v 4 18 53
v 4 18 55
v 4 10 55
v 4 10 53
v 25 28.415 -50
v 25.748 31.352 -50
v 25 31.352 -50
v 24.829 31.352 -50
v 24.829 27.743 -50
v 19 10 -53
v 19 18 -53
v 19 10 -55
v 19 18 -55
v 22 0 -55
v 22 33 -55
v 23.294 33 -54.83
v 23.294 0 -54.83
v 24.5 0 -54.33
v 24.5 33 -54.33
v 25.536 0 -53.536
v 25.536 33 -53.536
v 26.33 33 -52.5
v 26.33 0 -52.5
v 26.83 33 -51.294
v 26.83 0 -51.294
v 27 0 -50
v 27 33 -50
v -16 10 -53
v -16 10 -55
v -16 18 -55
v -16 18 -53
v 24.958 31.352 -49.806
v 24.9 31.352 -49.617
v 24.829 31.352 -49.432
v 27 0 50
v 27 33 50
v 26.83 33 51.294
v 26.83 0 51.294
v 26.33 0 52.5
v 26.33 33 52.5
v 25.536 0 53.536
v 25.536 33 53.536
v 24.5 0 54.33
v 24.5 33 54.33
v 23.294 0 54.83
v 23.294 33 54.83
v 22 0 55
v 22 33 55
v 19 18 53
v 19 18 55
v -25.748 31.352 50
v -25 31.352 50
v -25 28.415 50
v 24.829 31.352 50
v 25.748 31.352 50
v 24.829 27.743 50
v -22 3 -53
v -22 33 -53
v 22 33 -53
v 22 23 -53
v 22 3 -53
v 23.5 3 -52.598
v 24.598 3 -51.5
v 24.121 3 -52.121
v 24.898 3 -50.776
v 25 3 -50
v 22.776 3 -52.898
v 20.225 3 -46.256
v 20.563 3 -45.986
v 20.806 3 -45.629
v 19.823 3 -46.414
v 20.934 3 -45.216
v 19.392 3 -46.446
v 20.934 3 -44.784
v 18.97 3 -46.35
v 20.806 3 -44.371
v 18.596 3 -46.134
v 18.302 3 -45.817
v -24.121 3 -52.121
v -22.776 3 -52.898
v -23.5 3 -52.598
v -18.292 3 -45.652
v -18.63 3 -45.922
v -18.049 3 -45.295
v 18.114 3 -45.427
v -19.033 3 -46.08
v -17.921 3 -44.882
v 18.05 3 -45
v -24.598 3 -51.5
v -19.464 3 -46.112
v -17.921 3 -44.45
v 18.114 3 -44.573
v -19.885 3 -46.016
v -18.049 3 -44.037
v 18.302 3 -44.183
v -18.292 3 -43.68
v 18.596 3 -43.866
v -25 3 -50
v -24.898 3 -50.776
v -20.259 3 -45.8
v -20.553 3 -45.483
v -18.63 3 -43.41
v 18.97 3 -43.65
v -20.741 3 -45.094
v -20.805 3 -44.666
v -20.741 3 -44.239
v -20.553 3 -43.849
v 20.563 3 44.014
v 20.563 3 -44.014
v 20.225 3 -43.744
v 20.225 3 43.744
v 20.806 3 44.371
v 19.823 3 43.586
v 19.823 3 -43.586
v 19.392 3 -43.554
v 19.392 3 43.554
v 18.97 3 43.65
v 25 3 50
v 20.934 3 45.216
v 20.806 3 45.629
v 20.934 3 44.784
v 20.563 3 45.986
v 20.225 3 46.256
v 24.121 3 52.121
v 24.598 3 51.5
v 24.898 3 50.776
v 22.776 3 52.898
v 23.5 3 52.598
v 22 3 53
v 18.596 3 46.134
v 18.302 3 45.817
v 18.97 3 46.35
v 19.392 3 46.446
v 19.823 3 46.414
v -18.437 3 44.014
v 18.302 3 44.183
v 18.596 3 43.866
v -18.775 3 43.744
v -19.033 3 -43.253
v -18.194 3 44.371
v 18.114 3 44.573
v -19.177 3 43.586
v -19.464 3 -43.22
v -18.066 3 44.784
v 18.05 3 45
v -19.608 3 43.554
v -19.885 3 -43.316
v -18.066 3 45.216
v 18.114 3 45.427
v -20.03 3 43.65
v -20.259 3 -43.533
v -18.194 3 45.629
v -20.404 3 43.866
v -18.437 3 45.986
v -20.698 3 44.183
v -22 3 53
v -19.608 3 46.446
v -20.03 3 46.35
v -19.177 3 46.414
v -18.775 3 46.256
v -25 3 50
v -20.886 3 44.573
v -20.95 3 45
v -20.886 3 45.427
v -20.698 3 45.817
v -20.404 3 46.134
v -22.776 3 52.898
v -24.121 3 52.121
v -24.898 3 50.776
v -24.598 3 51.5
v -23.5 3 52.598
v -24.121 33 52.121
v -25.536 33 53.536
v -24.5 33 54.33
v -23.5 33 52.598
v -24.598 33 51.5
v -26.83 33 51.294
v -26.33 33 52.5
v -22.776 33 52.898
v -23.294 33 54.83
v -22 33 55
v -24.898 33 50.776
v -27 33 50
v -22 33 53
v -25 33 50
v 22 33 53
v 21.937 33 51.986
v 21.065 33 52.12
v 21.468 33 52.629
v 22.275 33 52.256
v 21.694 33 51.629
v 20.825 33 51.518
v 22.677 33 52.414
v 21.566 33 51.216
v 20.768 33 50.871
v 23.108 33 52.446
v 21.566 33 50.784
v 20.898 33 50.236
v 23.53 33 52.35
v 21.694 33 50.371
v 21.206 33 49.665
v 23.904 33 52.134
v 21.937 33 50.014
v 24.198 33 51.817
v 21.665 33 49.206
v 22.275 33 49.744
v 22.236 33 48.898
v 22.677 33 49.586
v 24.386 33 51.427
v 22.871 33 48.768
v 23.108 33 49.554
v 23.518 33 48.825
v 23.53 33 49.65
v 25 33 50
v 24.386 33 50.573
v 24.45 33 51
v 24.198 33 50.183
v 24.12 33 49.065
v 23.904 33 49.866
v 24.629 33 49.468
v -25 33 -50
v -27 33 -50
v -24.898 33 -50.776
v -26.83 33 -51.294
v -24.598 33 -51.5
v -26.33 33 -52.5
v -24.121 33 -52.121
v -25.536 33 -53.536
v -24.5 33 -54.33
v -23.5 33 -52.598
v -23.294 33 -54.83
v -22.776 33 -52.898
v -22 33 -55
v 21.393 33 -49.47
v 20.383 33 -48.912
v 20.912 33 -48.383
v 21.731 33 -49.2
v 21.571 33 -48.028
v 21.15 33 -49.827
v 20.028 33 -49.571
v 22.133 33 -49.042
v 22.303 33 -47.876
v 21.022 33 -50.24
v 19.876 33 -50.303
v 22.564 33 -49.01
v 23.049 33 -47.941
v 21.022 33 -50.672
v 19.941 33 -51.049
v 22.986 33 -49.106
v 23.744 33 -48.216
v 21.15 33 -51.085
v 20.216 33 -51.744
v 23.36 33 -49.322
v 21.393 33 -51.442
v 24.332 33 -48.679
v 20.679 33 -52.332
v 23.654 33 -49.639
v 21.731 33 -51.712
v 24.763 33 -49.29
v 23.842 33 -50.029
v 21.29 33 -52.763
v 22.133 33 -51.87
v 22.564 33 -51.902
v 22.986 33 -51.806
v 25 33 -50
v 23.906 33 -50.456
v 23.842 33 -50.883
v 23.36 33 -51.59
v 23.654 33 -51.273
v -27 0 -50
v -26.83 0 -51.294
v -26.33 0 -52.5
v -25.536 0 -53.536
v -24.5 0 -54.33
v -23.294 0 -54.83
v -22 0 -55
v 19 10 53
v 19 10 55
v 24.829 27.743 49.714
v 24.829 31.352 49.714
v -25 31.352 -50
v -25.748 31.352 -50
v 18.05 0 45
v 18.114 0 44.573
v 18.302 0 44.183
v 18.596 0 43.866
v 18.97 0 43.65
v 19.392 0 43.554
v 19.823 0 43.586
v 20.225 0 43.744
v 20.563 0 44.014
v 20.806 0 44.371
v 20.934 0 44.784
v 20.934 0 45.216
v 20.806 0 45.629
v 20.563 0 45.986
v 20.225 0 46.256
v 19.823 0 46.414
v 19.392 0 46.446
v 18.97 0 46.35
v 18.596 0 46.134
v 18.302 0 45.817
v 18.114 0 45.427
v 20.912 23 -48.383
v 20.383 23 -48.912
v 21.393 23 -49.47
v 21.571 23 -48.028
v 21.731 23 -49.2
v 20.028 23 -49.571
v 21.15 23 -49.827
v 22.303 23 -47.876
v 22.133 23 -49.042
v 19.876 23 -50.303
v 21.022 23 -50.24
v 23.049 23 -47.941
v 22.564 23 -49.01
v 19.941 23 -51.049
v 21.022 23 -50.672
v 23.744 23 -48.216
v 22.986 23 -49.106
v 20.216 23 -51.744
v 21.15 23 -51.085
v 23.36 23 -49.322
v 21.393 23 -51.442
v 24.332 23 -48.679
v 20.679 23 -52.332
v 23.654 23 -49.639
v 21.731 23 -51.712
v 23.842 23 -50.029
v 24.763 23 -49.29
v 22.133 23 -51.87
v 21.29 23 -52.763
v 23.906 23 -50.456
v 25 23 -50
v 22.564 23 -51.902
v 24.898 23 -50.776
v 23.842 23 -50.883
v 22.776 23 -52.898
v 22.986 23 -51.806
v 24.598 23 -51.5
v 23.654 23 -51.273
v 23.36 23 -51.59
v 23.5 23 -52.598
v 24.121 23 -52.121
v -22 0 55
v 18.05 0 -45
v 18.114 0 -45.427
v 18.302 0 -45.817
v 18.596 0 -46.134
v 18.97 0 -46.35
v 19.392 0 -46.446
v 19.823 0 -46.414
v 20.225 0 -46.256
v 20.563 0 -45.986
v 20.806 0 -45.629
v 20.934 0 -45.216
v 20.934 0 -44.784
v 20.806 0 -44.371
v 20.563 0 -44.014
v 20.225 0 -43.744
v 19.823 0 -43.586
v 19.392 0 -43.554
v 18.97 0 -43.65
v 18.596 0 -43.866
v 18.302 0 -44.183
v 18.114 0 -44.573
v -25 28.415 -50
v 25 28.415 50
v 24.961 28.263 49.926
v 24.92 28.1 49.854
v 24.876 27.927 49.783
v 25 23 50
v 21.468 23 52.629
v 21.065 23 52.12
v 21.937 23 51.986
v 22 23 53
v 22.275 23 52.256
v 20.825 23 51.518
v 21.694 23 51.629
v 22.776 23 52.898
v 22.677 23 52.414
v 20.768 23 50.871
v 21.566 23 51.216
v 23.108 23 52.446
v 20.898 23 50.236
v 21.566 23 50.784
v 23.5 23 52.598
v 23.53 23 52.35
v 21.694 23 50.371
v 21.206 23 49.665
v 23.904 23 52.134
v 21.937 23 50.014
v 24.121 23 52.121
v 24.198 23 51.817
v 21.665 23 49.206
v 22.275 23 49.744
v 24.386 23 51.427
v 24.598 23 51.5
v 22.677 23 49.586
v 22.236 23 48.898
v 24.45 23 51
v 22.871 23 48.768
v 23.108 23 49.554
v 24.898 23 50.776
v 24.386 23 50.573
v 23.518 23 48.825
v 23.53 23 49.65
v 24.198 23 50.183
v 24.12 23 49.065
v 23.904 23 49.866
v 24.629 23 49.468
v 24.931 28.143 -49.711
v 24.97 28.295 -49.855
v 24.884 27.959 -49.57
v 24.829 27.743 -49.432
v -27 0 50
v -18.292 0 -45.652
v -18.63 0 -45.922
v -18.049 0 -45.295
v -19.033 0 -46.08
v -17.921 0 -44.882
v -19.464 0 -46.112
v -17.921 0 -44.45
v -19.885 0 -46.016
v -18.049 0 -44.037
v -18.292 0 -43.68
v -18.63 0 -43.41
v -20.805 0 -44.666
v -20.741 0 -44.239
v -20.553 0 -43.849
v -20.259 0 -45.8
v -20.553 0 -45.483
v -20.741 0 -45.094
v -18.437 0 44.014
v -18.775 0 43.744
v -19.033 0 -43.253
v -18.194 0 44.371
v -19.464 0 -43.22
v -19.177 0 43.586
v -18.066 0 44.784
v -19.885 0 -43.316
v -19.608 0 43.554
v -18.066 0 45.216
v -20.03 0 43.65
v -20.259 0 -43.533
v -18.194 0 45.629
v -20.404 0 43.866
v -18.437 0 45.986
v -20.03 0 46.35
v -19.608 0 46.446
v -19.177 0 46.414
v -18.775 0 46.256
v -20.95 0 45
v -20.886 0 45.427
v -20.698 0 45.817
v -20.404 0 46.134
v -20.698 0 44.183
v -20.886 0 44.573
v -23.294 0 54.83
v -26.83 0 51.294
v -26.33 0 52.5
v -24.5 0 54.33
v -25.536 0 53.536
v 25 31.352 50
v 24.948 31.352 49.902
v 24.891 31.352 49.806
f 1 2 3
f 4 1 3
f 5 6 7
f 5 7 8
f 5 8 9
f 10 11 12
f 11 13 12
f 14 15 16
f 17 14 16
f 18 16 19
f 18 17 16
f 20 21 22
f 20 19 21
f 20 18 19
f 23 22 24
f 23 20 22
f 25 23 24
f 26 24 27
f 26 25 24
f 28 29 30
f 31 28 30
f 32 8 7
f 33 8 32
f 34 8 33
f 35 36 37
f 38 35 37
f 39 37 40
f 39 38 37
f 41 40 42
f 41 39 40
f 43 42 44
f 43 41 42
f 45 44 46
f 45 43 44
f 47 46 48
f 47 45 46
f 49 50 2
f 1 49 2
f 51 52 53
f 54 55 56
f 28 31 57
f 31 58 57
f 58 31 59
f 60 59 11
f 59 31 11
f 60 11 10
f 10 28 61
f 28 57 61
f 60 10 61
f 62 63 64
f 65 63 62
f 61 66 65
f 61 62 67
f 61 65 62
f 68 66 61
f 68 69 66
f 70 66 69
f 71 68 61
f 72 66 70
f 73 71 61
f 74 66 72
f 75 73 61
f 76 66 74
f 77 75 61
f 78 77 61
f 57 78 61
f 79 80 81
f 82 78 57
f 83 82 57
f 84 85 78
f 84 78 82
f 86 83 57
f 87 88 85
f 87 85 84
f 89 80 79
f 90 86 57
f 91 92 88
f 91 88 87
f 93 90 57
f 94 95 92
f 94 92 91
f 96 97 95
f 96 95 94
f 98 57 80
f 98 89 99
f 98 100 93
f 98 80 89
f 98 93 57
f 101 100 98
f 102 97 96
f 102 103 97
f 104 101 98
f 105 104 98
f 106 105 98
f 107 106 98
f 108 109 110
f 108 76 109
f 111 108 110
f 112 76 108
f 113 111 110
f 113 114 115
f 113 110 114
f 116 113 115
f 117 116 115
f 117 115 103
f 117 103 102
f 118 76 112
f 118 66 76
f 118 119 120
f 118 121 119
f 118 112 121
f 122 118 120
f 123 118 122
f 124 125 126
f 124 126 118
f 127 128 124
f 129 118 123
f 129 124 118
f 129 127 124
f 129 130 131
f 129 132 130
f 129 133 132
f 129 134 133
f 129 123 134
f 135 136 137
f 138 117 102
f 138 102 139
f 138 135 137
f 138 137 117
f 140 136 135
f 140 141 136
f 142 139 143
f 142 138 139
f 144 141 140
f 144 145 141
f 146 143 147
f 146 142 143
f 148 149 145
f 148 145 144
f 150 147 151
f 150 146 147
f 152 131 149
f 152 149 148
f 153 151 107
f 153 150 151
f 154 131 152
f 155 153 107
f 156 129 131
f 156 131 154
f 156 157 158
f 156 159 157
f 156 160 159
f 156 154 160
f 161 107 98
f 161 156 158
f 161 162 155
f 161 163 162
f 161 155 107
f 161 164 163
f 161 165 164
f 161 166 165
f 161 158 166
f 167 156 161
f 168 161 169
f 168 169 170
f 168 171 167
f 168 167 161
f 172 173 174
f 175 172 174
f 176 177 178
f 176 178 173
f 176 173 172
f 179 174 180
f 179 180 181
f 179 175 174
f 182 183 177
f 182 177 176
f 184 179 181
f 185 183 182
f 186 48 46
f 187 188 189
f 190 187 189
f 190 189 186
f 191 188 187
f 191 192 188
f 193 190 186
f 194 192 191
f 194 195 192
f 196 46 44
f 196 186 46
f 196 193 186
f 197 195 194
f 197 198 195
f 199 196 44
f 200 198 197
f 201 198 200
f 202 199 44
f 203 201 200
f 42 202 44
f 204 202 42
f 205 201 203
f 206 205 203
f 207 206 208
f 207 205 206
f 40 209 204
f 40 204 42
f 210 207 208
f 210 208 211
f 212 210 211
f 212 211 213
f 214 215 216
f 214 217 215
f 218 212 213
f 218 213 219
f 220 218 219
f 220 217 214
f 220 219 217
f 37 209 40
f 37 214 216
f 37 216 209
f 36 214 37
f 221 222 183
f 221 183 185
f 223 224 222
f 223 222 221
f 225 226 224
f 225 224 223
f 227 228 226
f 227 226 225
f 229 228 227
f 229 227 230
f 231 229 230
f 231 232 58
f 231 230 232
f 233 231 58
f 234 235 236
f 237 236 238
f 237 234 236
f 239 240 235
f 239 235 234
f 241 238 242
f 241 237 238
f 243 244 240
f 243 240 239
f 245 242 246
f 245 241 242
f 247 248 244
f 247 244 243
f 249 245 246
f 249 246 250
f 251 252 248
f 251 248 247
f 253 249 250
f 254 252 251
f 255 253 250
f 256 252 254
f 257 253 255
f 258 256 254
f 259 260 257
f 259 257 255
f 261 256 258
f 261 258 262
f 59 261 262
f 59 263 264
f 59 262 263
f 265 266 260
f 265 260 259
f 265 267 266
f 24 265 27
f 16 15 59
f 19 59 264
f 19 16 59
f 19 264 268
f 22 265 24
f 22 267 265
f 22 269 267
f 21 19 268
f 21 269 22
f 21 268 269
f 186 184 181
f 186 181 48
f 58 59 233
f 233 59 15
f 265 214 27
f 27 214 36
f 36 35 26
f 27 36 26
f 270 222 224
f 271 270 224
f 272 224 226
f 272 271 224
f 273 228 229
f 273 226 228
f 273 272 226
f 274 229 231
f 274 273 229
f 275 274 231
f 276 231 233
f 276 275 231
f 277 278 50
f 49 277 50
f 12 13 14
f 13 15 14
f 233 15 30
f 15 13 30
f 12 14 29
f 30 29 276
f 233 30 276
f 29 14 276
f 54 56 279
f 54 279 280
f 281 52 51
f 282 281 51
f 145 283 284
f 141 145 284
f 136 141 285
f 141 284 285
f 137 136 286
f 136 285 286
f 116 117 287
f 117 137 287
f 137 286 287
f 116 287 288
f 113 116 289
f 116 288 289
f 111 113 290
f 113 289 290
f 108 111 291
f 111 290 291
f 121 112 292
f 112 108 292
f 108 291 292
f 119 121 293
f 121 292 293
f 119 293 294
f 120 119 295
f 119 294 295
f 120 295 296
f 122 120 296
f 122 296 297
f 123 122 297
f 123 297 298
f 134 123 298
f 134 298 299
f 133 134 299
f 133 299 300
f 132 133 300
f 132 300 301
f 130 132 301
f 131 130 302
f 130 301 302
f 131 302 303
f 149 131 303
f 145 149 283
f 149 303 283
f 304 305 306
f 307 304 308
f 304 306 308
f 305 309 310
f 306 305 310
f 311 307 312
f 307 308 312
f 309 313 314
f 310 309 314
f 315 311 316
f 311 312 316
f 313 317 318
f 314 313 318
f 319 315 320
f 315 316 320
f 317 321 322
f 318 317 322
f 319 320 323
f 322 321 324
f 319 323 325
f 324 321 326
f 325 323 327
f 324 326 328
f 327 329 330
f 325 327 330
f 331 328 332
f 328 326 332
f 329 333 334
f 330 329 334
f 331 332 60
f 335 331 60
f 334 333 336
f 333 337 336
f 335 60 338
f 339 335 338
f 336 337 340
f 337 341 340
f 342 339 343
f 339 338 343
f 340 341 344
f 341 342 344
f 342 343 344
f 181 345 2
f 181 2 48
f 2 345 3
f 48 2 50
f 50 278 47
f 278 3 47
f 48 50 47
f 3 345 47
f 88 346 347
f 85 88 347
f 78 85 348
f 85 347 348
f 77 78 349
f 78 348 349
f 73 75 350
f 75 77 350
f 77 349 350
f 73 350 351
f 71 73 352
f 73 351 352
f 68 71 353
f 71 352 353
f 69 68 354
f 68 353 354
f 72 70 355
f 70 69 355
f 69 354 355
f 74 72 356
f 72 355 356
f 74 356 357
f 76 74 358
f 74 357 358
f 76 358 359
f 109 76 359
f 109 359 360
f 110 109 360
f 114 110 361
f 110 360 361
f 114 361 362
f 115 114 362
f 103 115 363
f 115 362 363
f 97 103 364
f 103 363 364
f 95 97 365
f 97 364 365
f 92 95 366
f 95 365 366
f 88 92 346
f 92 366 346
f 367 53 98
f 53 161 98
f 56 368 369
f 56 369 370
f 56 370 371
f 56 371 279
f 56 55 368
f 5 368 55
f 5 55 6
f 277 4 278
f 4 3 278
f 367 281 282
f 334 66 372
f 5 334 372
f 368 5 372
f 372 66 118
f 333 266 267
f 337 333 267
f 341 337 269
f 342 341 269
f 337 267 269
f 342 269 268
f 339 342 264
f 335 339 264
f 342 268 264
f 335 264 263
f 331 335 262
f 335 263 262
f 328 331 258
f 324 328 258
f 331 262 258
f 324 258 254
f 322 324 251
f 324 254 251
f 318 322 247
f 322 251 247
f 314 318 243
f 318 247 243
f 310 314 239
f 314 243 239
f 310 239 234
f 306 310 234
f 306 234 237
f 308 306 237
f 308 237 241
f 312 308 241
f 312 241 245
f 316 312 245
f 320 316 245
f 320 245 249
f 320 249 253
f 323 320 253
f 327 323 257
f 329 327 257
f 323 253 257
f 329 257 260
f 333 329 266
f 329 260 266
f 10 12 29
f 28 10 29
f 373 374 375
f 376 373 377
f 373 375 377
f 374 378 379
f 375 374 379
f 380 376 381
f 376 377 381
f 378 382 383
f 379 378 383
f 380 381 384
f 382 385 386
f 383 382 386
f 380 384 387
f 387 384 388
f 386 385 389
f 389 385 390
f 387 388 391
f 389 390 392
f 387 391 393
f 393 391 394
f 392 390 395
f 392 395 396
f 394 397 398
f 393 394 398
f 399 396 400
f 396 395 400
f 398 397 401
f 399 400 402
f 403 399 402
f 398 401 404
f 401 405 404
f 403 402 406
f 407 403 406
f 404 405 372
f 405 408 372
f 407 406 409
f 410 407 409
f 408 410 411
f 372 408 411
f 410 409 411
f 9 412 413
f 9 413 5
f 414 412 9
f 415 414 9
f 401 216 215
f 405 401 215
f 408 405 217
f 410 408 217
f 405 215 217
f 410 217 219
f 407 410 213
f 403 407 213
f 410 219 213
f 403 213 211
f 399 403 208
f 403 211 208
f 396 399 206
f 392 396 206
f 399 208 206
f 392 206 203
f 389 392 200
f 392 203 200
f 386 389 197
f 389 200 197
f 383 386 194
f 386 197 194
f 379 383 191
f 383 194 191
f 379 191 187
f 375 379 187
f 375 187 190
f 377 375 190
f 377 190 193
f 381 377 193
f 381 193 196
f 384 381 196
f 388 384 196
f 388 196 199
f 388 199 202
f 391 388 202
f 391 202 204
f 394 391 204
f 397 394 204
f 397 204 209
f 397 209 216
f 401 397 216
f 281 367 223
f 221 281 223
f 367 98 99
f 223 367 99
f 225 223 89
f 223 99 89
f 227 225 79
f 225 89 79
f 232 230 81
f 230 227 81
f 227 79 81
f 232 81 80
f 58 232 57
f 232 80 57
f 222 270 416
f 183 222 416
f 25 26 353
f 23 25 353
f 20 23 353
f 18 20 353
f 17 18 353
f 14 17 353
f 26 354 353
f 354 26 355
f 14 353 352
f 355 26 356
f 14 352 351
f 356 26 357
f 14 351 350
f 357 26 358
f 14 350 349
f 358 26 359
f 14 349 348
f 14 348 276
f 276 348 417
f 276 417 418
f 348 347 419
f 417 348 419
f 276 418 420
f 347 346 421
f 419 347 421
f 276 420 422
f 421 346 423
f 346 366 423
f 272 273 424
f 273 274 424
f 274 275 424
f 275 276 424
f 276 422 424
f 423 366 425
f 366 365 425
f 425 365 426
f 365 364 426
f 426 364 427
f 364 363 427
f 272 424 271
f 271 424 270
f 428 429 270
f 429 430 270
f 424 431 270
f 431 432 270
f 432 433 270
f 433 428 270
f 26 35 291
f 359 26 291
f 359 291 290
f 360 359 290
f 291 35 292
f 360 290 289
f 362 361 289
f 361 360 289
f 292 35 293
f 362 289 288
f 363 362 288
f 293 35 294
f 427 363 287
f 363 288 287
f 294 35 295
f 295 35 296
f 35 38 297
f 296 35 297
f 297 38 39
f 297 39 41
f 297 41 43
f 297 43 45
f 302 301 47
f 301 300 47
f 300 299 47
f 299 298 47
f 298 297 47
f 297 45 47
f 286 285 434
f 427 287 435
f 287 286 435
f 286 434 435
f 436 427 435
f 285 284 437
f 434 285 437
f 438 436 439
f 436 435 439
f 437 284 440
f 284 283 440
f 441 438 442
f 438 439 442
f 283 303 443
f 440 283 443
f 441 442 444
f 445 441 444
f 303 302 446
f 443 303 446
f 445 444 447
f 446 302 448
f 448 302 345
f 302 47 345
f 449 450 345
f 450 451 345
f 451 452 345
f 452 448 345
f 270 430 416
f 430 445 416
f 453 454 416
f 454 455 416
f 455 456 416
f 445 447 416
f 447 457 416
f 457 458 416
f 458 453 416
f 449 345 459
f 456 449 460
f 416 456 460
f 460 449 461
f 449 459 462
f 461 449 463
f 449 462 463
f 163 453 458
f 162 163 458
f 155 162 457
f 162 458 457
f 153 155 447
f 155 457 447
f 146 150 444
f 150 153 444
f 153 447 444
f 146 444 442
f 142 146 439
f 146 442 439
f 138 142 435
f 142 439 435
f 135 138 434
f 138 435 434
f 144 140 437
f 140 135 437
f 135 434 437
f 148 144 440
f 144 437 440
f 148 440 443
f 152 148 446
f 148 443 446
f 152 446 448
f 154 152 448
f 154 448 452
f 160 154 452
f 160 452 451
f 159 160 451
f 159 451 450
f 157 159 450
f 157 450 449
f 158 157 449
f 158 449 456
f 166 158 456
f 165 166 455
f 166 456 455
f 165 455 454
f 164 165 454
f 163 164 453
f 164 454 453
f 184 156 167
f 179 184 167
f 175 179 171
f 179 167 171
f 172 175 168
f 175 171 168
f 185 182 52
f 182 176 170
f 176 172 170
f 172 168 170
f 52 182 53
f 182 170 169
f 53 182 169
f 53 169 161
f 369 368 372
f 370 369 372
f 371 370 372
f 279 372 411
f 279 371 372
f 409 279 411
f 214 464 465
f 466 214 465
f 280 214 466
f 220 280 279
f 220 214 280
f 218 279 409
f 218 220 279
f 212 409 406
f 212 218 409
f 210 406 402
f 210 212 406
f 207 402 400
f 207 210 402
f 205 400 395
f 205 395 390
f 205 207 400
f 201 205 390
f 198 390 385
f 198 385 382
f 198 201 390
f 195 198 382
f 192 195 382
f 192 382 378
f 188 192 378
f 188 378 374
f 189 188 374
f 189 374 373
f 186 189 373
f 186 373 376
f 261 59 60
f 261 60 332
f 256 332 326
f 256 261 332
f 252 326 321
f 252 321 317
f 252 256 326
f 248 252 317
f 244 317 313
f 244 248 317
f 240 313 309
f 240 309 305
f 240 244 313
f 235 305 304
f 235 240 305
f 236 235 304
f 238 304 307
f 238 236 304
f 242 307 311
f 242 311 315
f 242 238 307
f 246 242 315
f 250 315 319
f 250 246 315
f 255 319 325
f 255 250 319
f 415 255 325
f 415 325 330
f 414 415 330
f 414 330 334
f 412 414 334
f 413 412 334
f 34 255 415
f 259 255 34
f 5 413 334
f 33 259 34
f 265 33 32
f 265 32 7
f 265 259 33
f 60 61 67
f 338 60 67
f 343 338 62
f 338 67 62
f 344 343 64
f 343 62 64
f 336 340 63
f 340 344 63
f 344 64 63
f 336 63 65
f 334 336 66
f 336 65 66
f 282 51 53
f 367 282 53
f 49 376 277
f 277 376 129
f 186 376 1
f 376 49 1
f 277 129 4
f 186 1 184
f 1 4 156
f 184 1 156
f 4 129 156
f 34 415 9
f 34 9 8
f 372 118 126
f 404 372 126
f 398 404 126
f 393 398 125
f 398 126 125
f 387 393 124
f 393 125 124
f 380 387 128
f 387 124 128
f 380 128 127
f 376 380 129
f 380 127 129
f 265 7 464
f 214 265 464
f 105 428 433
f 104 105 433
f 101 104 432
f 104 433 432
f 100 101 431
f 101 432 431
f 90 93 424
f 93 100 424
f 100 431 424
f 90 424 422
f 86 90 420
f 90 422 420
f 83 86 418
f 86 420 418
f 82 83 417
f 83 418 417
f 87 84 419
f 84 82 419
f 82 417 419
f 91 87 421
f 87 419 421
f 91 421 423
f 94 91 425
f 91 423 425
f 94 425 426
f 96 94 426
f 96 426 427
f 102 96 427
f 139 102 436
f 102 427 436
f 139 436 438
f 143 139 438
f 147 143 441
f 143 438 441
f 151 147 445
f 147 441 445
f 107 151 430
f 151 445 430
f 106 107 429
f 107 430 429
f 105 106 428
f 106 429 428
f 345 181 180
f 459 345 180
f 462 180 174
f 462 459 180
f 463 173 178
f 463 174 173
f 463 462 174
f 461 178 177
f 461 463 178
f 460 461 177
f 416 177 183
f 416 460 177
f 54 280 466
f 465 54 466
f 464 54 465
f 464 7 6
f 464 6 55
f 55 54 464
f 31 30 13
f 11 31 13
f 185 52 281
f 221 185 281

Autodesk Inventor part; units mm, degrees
ref_plane "YZ Plane" through (0, 0, 0) normal (1, 0, 0) x (0, 1, 0)
ref_plane "XZ Plane" through (0, 0, 0) normal (0, 1, 0) x (-1, 0, 0)
ref_plane "XY Plane" through (0, 0, 0) normal (0, 0, 1) x (1, 0, 0)
sketch "Sketch1" plane through (0, 0, 0) normal (0, 1, 0) x (-1, 0, 0)
  line L0 (-19.5, -45) -> (19.5, -45) construction
  line L1 (19.5, -45) -> (19.5, 45) construction
  line L2 (19.5, 45) -> (-19.5, 45) construction
  line L3 (-19.5, 45) -> (-19.5, -45) construction
  line L4 (-19.5, -45) -> (19.5, 45) construction
  line L5 (19.5, -45) -> (-19.5, 45) construction
  line L6 (-27, -55) -> (27, -55)
  line L7 (27, -55) -> (27, 55)
  line L8 (27, 55) -> (-27, 55)
  line L9 (-27, 55) -> (-27, -55)
  line L10 (-27, -55) -> (27, 55) construction
  line L11 (27, -55) -> (-27, 55) construction
  circle A0 centre (19.5, 45) radius 1.45
  circle A1 centre (-19.5, 45) radius 1.45
  circle A2 centre (19.3553, -44.6662) radius 1.45
  circle A3 centre (-19.5, -45) radius 1.45
  point P0 (0, 0)
  dimension "d0" = 39
  dimension "d1" = 90
  dimension "d2" = 54
  dimension "d3" = 110
  dimension "d4" = 2.9
  dimension "d5" = 2.9
  dimension "d6" = 2.9
  dimension "d7" = 2.9
extrude "Extrusion1" add sketch "Sketch1" along normal blind 3
fillet "Fillet1" radius 5 4 edges at (27, 1.5, 55) (-27, 1.5, 55) (-27, 1.5, -55) (27, 1.5, -55)
sketch "Sketch2" plane through (0, 3, 0) normal (0, 1, 0) x (1, 0, 0)
  arc A0 (27, 50) -> (22, 55) centre (22, 50) ccw projected
  line L0 (22, 55) -> (-22, 55) projected
  arc A1 (-22, 55) -> (-27, 50) centre (-22, 50) ccw projected
  line L1 (-27, 50) -> (-27, -50) projected
  arc A2 (-27, -50) -> (-22, -55) centre (-22, -50) ccw projected
  line L2 (-22, -55) -> (22, -55) projected
  arc A3 (22, -55) -> (27, -50) centre (22, -50) ccw projected
  line L3 (27, -50) -> (27, 50) projected
  circle A4 centre (19.5, 45) radius 1.45 projected
  circle A5 centre (-19.3553, 44.6662) radius 1.45 projected
  circle A6 centre (19.5, -45) radius 1.45 projected
  circle A7 centre (-19.5, -45) radius 1.45 projected
  line L4 (-25, -50) -> (-25, 50)
  arc A8 (-22, 53) -> (-25, 50) centre (-22, 50) ccw
  line L5 (-22, 53) -> (22, 53)
  arc A9 (25, 50) -> (22, 53) centre (22, 50) ccw
  line L6 (25, 50) -> (25, -50)
  arc A10 (22, -53) -> (25, -50) centre (22, -50) ccw
  line L7 (22, -53) -> (-22, -53)
  arc A11 (-25, -50) -> (-22, -53) centre (-22, -50) ccw
  point P0 (0, 0)
  dimension "d11" = 2
extrude "Extrusion2" add sketch "Sketch2" along normal blind 30 contours L3 A3 L2 A2 L1 A1 L0 A0
sketch "Sketch3" plane through (-22, 0, 55) normal (0, 0, 1) x (1, 0, 0)
  line L0 (41, 18) -> (26, 18)
  line L1 (26, 18) -> (26, 10)
  line L2 (26, 10) -> (41, 10)
  line L3 (41, 10) -> (41, 18)
  line L4 (41, 18) -> (26, 10) construction
  line L5 (26, 18) -> (41, 10) construction
  line L6 (49, 0) -> (49, 33) projected
  line L7 (0, 0) -> (44, 0) projected
  point P0 (22, 0)
  point P1 (33.5, 14)
  dimension "d14" = 8
  dimension "d15" = 10
  dimension "d16" = 15
  dimension "d17" = 8
extrude "Extrusion3" cut sketch "Sketch3" against normal blind 30
sketch "Sketch4" plane through (22, 0, -55) normal (0, 0, -1) x (-1, 0, 0)
  line L0 (0, 0) -> (0, 33) projected
  line L1 (0, 0) -> (44, 0) projected
  line L2 (44, 33) -> (44, 0) projected
  line L3 (0, 33) -> (44, 33) projected
  line L4 (18, 10) -> (18, 18) construction
  line L5 (18, 18) -> (3, 18) construction
  line L6 (3, 18) -> (3, 10) construction
  line L7 (3, 10) -> (18, 10) construction
  line L8 (44, 0) -> (44, 33) construction
  line L9 (44, 0) -> (0, 0) construction
  line L10 (0, 33) -> (0, 0) construction
  line L11 (44, 33) -> (0, 33) construction
  line L12 (3, 10) -> (38, 10)
  line L13 (38, 10) -> (38, 18)
  line L14 (38, 18) -> (3, 18)
  line L15 (3, 18) -> (3, 10)
  point P0 (22, 0)
  dimension "d20" = 35
extrude "Extrusion4" cut sketch "Sketch4" against normal blind 30 contours L15 L14 L13 L12
sketch "Sketch5" plane through (0, 33, 0) normal (0, 1, 0) x (1, 0, 0)
  arc A0 (-25, -50) -> (-22, -53) centre (-22, -50) ccw projected
  arc A1 (22, -53) -> (25, -50) centre (22, -50) ccw projected
  arc A2 (25, 50) -> (22, 53) centre (22, 50) ccw projected
  arc A3 (-22, 53) -> (-25, 50) centre (-22, 50) ccw projected
  circle A4 centre (-23, -51) radius 1.45
  circle A5 centre (23, -51) radius 1.45
  circle A6 centre (-23, 51) radius 1.45
  arc A7 (-22, 53) -> (-25, 50) centre (-22, 50) ccw projected
  line L0 (-22, 53) -> (22, 53) projected
  arc A8 (25, 50) -> (22, 53) centre (22, 50) ccw projected
  line L1 (25, 50) -> (25, -50) projected
  arc A9 (22, -53) -> (25, -50) centre (22, -50) ccw projected
  line L2 (22, -53) -> (-22, -53) projected
  arc A10 (-25, -50) -> (-22, -53) centre (-22, -50) ccw projected
  line L3 (-25, -50) -> (-25, 50) projected
  arc A11 (27, 50) -> (22, 55) centre (22, 50) ccw projected
  line L4 (22, 55) -> (-22, 55) projected
  arc A12 (-22, 55) -> (-27, 50) centre (-22, 50) ccw projected
  line L5 (-27, 50) -> (-27, -50) projected
  arc A13 (-27, -50) -> (-22, -55) centre (-22, -50) ccw projected
  line L6 (-22, -55) -> (22, -55) projected
  arc A14 (22, -55) -> (27, -50) centre (22, -50) ccw projected
  line L7 (27, -50) -> (27, 50) projected
  arc A15 (-22, 51) -> (-23, 50) centre (-22, 50) ccw construction
  line L8 (-22, 51) -> (22, 51) construction
  arc A16 (23, 50) -> (22, 51) centre (22, 50) ccw construction
  line L9 (23, 50) -> (23, -50) construction
  arc A17 (22, -51) -> (23, -50) centre (22, -50) ccw construction
  line L10 (22, -51) -> (-22, -51) construction
  arc A18 (-23, -50) -> (-22, -51) centre (-22, -50) ccw construction
  line L11 (-23, -50) -> (-23, 50) construction
  line L12 (23, 51) -> (-23, 51) construction
  line L13 (-23, 51) -> (-23, -51) construction
  line L14 (-23, -51) -> (23, -51) construction
  line L15 (23, -51) -> (23, 51) construction
  line L16 (23, 51) -> (-23, -51) construction
  line L17 (-23, 51) -> (23, -51) construction
  line L18 (-25, 50) -> (-25, -50) projected
  arc A19 (-22, -53) -> (-25, -50) centre (-22.8913, -50.8913) ccw
  line L19 (-22, -53) -> (22, -53) projected
  arc A20 (25, -50) -> (22, -53) centre (22.921, -50.921) ccw
  arc A21 (-25, 50) -> (-22, 53) centre (-22.9063, 50.9063) ccw
  arc A22 (25, 50) -> (22, 53) centre (22, 50) ccw projected
  arc A23 (22, 53) -> (25, 50) centre (22.4561, 50.4561) ccw
  circle A24 centre (22.4561, 50.4561) radius 1.45
  circle A25 centre (-23, -51) radius 2.2361
  circle A26 centre (23, -51) radius 2.2361
  point P0 (0, 0)
  point P1 (24.1213, 52.1213)
  dimension "d23" = 2.9
  dimension "d24" = 2.9
  dimension "d25" = 2.9
  dimension "d27" = 2
  dimension "d28" = 2.9
extrude "Extrusion5" add sketch "Sketch5" against normal blind 10 contours A26 A1 | A1 A26 | A2 A23
ref_plane "Work Plane1" through (22, 3, 50) normal (0, 0, -1) x (-1, 0, 0)
sketch "Sketch6" plane through (22, 3, 50) normal (0, 0, -1) x (-1, 0, 0)
  line L0 (46.829, 28.3524) -> (47.7477, 28.3524)
  line L1 (47.7477, 28.3524) -> (46.829, 24.7431)
  line L2 (46.829, 24.7431) -> (46.829, 28.3524)
  line L3 (22, 24.0878) -> (22, -17.3662)
  line L4 (-2.829, 28.3524) -> (-3.7477, 28.3524)
  line L5 (-3.7477, 28.3524) -> (-2.829, 24.7431)
  line L6 (-2.829, 24.7431) -> (-2.829, 28.3524)
  point P0 (22, -3)
extrude "Extrusion6" cut sketch "Sketch6" along normal blind 100
properties part number "00_Case_Powersupply_Galvo"
